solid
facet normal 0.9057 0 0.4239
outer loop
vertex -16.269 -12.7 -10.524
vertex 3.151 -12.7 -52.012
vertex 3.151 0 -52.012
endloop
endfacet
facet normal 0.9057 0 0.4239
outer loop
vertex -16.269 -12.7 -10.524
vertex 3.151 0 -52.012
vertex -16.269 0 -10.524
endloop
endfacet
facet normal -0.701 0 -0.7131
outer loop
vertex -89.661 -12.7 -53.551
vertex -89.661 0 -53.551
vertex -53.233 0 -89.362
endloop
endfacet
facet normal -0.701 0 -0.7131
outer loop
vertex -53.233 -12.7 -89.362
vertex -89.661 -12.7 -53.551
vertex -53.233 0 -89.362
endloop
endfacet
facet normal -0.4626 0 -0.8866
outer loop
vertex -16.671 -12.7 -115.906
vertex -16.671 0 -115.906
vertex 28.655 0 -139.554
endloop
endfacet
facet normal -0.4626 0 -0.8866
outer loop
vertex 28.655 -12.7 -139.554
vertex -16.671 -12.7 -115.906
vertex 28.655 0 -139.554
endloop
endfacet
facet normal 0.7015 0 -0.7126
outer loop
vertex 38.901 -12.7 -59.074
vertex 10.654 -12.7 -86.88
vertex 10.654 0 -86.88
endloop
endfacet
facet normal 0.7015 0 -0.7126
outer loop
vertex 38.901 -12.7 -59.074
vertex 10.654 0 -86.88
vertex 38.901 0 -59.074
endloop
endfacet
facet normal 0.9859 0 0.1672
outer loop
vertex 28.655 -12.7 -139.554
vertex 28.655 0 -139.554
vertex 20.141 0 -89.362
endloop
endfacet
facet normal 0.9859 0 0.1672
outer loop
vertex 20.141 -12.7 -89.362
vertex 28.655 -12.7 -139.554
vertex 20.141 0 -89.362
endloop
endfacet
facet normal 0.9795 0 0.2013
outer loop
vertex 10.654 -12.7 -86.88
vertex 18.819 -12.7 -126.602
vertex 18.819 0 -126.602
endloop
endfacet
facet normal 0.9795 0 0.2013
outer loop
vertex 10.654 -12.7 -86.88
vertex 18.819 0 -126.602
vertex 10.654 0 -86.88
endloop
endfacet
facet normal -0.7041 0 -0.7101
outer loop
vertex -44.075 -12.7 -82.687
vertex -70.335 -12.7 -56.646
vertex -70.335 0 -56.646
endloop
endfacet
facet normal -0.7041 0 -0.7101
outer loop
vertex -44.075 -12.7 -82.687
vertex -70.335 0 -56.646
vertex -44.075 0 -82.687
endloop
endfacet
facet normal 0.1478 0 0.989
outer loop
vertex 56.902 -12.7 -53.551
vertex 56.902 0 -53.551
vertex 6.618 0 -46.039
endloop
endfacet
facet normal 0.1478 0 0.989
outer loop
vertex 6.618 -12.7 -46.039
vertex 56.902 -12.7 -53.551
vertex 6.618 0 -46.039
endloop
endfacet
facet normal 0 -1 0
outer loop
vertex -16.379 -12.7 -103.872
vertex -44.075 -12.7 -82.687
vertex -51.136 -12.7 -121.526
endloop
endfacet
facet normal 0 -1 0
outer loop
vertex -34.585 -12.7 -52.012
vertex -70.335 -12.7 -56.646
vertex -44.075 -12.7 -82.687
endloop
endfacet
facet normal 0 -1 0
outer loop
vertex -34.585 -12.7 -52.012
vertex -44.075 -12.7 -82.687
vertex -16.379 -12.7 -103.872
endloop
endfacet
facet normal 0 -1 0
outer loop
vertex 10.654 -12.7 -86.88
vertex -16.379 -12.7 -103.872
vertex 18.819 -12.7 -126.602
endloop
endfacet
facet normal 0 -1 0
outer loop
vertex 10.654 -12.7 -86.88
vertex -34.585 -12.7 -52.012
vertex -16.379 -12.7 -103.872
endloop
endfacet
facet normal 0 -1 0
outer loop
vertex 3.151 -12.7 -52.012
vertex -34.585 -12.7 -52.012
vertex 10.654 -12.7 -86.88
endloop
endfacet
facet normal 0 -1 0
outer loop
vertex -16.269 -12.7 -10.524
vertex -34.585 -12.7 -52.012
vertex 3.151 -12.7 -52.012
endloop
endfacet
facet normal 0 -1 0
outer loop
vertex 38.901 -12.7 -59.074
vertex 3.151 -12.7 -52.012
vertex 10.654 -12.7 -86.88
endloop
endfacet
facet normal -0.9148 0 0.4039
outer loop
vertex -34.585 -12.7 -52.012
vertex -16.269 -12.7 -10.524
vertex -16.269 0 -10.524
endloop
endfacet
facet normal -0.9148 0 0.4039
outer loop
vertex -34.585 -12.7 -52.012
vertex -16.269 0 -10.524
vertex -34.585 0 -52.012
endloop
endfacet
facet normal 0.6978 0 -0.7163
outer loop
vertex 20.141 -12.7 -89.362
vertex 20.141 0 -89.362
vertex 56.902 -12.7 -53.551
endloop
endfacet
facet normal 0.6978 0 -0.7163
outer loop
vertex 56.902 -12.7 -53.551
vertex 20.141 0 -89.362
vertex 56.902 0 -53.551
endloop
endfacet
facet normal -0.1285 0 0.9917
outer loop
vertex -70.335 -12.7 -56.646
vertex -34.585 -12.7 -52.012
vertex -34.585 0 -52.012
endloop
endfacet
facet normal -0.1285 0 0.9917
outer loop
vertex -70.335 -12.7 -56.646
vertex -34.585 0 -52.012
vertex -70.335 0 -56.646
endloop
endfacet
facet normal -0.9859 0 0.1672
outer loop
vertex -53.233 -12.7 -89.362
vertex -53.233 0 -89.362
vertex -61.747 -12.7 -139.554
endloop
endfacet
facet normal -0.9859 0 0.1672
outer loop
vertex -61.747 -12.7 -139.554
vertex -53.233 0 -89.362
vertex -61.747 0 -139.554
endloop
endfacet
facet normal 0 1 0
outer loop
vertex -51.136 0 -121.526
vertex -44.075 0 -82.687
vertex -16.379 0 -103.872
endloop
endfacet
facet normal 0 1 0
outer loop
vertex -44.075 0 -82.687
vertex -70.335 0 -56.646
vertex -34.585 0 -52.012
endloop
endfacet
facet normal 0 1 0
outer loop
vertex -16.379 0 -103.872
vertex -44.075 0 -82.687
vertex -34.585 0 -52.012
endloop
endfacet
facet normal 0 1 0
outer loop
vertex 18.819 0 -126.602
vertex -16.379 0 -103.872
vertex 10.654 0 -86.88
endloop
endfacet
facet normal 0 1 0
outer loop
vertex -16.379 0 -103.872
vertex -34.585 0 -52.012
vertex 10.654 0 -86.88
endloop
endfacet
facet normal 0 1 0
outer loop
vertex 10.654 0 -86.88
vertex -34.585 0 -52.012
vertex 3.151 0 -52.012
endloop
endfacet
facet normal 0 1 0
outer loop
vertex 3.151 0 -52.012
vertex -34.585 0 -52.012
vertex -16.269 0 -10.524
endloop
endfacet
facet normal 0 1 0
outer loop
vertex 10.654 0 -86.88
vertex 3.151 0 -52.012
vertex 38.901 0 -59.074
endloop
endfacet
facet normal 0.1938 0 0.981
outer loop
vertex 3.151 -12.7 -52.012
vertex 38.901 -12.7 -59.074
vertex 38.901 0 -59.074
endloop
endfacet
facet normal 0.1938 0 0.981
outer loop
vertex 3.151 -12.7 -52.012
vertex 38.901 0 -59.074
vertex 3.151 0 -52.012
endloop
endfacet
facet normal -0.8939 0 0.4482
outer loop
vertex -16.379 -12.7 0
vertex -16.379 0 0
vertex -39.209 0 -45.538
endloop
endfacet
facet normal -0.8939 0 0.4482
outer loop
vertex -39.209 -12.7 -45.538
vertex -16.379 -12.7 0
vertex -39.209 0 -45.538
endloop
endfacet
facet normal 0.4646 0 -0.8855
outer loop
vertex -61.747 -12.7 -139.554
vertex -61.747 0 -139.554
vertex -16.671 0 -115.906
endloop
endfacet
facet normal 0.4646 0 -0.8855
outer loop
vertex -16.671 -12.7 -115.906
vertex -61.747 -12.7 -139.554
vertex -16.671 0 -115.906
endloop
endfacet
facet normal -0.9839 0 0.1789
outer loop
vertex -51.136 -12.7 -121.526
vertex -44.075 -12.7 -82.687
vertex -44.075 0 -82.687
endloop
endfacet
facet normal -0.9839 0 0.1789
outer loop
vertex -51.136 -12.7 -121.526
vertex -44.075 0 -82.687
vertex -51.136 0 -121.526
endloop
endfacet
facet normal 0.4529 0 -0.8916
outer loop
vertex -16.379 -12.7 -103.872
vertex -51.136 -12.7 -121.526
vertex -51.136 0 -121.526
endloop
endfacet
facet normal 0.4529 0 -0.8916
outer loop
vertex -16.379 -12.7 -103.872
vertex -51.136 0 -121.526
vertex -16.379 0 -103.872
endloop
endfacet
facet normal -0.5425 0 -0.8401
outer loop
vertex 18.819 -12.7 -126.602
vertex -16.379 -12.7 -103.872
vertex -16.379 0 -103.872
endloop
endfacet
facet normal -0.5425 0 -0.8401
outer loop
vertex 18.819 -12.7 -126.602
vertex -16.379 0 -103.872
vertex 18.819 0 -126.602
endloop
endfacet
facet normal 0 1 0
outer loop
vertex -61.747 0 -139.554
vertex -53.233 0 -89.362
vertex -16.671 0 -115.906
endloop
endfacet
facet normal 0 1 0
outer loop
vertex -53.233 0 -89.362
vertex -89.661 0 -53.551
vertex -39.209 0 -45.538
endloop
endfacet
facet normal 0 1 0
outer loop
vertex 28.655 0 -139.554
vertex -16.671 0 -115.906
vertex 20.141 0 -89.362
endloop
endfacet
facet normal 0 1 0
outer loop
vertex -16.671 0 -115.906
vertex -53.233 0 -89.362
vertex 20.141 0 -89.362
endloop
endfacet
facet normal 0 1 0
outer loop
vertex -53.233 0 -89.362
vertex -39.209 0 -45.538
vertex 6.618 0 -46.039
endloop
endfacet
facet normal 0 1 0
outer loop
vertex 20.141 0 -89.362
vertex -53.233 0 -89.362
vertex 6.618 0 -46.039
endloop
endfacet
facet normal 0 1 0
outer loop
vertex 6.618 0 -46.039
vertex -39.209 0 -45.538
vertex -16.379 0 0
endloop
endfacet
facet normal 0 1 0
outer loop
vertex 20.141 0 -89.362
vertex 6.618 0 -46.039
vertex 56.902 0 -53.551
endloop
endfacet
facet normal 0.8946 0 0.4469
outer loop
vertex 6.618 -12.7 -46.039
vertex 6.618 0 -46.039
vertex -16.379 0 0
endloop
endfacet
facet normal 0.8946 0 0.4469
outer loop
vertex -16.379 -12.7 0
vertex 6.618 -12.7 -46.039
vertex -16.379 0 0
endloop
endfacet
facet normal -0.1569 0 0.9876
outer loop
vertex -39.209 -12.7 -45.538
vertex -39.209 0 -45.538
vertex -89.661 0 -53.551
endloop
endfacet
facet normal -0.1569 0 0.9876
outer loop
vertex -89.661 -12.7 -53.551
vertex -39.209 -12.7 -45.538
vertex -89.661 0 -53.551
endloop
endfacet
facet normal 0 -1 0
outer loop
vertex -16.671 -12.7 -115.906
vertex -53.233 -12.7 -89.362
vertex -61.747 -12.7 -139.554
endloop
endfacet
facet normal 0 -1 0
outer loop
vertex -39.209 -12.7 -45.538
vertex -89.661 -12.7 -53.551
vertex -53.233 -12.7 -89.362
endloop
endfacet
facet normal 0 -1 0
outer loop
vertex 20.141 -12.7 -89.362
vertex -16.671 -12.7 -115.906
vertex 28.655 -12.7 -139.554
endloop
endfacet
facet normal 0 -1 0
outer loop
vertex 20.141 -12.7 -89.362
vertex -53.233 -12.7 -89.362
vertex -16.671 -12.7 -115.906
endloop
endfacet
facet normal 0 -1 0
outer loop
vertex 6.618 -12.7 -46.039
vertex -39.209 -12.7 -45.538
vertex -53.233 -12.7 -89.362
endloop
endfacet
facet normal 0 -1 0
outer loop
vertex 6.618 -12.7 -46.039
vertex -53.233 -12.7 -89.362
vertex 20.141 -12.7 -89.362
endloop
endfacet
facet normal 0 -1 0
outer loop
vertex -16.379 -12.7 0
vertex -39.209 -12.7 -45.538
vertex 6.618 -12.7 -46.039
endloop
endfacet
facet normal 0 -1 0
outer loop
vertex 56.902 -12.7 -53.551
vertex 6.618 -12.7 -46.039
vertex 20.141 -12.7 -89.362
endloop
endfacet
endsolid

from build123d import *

# Parameters (mm, degrees)
F1_DEPTH = 12.7
F3_DEPTH = 12.7


with BuildPart() as f1:
    # F0 (on Front) → F1 (new body)
    with BuildSketch(Plane.XZ):
        Polygon((6.618203, -46.038546), (-16.379258, 0), (-39.209124, -45.537699), (-89.660898, -53.551219), (-53.232785, -89.361645), (-61.747152, -139.553732), (-16.671093, -115.906432), (28.655386, -139.553732), (20.14102, -89.361645), (56.902383, -53.551219), align=None)
    extrude(amount=F1_DEPTH)


with BuildPart() as f3:
    # F2 (on face) → F3 (new body)
    with BuildSketch(Plane.XZ.offset(12.7)):
        Polygon((3.150909, -52.012134), (-16.268918, -10.524325), (-34.585346, -52.012134), (-70.335478, -56.646414), (-44.074576, -82.686633), (-51.136333, -121.526286), (-16.379258, -103.871897), (18.819179, -126.60192), (10.654025, -86.879551), (38.901042, -59.073891), align=None)
    extrude(amount=-F3_DEPTH)


solid = Compound([f1.part, f3.part])
